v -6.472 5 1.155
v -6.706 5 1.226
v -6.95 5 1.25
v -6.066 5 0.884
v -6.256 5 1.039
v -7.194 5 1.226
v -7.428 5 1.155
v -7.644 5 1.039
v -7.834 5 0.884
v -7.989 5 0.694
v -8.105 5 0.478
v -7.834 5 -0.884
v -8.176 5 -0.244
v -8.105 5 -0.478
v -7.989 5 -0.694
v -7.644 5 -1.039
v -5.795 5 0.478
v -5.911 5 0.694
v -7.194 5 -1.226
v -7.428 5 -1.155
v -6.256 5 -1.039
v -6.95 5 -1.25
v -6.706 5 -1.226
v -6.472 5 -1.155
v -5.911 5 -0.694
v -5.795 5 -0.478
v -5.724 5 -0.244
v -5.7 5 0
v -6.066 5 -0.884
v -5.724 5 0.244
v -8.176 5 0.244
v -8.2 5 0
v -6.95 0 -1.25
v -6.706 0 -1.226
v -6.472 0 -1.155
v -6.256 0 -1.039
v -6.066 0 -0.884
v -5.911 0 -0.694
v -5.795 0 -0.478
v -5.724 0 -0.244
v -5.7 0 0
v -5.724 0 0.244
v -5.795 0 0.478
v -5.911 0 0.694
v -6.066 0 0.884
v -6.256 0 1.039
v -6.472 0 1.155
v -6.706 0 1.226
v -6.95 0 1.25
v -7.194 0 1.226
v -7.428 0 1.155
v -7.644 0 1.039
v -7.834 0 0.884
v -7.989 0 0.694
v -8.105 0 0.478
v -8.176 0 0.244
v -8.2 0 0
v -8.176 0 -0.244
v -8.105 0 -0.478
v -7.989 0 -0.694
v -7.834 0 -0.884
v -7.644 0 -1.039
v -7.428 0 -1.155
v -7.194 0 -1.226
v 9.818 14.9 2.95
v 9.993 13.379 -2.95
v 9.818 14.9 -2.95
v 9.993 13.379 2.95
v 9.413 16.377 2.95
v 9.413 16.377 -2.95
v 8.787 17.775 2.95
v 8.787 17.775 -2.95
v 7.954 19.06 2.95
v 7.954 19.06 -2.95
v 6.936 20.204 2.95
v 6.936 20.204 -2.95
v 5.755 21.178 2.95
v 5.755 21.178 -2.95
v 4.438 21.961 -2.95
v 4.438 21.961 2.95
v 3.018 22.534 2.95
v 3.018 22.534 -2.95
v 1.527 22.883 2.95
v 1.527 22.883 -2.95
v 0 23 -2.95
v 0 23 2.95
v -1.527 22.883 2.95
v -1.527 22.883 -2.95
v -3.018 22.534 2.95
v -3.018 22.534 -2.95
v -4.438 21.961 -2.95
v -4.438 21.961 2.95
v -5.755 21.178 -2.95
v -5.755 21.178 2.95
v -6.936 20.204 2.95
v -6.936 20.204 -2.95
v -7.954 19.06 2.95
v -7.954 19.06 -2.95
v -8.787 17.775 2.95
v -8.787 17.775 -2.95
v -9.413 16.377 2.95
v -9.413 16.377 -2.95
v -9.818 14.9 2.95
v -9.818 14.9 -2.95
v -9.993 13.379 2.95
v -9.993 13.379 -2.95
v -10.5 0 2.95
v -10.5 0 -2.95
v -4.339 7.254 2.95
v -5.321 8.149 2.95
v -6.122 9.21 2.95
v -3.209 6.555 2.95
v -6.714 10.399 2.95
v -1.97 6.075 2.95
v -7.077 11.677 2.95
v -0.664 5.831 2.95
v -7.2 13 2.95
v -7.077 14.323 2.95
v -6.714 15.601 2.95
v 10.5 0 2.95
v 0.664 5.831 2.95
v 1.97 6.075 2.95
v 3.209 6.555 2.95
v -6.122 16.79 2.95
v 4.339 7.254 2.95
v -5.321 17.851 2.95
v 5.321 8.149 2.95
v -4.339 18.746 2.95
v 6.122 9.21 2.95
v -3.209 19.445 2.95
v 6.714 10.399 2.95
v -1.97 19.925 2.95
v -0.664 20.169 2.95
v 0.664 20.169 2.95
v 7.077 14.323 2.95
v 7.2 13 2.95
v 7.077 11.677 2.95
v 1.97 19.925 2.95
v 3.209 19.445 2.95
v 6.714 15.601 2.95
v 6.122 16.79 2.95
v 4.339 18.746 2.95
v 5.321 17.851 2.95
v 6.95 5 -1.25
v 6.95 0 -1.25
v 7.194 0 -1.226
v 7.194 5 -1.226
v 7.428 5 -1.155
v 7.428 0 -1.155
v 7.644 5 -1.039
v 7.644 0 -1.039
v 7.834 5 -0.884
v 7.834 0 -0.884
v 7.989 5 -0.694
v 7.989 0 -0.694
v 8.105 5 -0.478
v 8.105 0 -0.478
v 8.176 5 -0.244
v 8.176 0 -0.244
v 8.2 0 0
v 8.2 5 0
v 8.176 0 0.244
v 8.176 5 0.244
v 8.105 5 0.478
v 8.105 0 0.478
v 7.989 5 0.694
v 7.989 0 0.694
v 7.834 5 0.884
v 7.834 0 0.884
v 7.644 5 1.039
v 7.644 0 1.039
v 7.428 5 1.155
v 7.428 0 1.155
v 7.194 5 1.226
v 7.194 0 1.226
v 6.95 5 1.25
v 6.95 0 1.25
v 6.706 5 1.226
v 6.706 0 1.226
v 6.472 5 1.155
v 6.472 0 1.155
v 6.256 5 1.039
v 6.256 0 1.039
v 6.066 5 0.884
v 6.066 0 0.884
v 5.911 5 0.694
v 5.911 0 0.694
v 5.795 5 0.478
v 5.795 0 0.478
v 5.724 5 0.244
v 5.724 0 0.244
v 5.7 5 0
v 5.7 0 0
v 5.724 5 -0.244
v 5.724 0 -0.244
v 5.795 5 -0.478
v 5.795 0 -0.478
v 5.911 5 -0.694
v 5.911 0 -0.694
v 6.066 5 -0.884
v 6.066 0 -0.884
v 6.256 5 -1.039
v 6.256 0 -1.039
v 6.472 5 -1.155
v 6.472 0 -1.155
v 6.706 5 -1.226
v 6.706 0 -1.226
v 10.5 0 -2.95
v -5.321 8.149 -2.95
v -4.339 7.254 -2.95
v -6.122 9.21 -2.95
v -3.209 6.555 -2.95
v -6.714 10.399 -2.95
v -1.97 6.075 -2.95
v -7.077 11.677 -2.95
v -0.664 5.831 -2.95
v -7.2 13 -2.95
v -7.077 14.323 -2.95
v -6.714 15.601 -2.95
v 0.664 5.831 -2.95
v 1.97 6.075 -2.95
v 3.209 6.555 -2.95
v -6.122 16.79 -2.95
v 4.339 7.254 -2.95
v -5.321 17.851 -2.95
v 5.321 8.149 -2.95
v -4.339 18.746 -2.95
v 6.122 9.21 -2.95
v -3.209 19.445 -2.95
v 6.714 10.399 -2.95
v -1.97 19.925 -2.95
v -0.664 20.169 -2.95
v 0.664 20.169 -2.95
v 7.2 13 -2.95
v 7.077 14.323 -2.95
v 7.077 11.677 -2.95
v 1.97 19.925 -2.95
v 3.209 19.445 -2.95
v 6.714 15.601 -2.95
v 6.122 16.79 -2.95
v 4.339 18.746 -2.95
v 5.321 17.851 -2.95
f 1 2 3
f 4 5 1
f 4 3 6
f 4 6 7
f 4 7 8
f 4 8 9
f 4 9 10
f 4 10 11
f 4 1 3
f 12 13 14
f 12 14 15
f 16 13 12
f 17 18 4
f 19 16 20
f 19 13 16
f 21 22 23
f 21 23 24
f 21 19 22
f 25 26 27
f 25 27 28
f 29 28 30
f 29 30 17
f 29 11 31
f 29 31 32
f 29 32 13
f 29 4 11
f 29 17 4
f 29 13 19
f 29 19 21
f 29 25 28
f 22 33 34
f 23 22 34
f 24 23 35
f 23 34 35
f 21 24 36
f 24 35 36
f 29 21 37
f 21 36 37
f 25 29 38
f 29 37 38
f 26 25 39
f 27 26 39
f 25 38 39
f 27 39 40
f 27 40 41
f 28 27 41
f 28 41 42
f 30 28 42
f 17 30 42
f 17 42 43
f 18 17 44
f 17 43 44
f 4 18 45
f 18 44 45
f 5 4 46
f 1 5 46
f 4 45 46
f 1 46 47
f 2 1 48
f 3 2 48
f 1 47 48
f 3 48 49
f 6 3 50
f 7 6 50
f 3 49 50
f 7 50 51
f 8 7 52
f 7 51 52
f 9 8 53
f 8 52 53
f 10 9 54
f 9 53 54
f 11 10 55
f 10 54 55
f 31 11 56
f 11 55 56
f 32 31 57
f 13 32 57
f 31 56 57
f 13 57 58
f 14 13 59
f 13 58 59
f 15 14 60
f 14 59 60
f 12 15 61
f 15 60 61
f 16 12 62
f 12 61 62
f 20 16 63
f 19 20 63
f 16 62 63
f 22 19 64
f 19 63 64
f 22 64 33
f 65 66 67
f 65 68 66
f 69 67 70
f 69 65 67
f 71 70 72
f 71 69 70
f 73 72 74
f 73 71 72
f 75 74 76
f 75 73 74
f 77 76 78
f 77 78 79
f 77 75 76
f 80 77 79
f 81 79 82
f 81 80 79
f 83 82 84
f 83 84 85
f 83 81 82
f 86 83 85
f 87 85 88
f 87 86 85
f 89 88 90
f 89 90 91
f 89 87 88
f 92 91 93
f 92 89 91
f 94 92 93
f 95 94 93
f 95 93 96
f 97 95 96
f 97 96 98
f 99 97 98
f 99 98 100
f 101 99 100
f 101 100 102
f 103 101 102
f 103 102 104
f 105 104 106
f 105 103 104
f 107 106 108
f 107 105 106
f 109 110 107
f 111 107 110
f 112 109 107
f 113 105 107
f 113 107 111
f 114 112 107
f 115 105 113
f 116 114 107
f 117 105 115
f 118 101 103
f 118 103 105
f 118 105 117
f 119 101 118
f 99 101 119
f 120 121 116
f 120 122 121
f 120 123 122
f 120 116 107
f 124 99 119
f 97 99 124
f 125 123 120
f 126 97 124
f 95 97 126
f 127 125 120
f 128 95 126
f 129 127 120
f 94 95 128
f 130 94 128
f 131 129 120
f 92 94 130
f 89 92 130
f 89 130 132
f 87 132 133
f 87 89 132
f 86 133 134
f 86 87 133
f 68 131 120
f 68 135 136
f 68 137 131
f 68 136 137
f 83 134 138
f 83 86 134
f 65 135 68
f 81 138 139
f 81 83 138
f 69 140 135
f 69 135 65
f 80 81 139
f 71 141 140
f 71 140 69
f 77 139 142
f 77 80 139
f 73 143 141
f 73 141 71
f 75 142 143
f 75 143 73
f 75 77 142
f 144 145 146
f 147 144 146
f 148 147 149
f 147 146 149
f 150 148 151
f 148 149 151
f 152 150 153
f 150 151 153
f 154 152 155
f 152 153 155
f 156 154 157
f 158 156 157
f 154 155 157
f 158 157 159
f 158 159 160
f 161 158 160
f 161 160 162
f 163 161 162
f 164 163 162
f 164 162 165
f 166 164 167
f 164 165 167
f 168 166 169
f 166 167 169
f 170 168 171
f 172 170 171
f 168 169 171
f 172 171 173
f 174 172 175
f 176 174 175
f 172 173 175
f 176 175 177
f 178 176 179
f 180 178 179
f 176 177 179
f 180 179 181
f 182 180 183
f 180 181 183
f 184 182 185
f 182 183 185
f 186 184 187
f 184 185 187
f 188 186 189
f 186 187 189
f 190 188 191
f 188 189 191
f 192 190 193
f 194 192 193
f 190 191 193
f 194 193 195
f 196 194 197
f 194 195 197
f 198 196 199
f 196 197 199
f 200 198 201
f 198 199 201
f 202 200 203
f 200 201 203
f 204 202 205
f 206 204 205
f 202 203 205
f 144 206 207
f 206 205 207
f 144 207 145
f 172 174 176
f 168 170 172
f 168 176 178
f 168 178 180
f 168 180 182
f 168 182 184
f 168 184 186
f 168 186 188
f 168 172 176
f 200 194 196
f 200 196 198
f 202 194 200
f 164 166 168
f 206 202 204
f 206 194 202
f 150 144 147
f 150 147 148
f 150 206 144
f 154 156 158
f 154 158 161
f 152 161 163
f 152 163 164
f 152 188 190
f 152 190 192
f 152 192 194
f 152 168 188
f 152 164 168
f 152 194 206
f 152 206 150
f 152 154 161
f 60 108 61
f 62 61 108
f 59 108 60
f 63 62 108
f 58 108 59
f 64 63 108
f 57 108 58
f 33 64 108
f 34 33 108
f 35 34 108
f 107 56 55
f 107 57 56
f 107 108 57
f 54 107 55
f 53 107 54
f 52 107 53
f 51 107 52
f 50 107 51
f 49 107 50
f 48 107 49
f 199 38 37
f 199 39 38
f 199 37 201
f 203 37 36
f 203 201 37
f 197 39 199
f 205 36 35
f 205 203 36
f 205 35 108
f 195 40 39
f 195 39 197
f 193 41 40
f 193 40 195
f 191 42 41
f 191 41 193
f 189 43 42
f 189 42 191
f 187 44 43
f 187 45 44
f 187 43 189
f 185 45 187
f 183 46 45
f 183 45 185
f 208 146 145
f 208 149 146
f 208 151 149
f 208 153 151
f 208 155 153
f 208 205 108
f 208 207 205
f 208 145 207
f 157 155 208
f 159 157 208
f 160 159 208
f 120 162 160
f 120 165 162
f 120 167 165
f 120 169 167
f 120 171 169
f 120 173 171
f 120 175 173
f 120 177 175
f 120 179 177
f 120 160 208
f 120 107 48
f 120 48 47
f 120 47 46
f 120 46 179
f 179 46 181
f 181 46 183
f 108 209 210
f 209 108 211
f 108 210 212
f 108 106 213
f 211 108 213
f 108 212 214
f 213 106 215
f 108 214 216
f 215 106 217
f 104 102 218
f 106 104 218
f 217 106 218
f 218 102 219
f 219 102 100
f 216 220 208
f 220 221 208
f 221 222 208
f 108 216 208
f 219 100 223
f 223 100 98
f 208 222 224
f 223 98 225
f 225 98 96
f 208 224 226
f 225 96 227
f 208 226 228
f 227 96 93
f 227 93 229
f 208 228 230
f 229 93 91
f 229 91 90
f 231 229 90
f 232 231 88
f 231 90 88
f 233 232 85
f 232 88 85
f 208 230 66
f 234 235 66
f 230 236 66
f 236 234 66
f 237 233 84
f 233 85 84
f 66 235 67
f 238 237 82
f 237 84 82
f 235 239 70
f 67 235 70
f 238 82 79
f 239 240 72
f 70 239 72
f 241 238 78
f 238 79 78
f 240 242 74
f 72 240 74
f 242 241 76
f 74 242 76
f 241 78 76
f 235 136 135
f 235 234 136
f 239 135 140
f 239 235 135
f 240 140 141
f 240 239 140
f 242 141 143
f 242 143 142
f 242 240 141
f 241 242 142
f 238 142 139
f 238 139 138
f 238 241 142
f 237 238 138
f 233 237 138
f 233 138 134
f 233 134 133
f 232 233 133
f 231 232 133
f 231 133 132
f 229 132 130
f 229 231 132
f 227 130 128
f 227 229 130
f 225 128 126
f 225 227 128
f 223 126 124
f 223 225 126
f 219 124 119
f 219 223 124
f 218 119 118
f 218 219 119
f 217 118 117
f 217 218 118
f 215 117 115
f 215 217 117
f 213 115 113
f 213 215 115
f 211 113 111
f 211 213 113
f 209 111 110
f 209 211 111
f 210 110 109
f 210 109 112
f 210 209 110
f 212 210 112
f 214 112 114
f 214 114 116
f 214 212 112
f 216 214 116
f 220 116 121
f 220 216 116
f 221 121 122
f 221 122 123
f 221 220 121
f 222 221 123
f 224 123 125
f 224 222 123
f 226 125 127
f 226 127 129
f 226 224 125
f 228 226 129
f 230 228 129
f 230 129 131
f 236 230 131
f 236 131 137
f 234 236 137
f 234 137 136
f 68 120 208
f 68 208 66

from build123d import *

# Parameters (mm, degrees)
SKETCH1_R           = 7.2
BOSS_EXTRUDE1_DEPTH = 2.95
SKETCH2_R           = 1.25
CUT_EXTRUDE1_DEPTH  = 5


with BuildPart() as part:
    # Sketch1 → Boss-Extrude1 (new, symmetric)
    with BuildSketch(Plane.XY):
        with BuildLine():
            Line((-9.992822271, 13.378817988), (-10.5, 0))
            Line((-10.5, 0), (10.5, 0))
            Line((10.5, 0), (9.992822271, 13.378817988))
            ThreePointArc((9.992822271, 13.378817988), (0, 23), (-9.992822271, 13.378817988))
        make_face()
        with Locations((0, 13)):
            Circle(SKETCH1_R, mode=Mode.SUBTRACT)
    extrude(amount=BOSS_EXTRUDE1_DEPTH, both=True)

    # Sketch2 → Cut-Extrude1 (cut)
    with BuildSketch(Plane.XZ):
        with Locations(Location((-6.95, 0, 0), (0, 0, 270))):
            Circle(SKETCH2_R)
        with Locations(Location((6.95, 0, 0), (0, 0, 270))):
            Circle(SKETCH2_R)
    extrude(amount=-CUT_EXTRUDE1_DEPTH, mode=Mode.SUBTRACT)


solid = part.part
